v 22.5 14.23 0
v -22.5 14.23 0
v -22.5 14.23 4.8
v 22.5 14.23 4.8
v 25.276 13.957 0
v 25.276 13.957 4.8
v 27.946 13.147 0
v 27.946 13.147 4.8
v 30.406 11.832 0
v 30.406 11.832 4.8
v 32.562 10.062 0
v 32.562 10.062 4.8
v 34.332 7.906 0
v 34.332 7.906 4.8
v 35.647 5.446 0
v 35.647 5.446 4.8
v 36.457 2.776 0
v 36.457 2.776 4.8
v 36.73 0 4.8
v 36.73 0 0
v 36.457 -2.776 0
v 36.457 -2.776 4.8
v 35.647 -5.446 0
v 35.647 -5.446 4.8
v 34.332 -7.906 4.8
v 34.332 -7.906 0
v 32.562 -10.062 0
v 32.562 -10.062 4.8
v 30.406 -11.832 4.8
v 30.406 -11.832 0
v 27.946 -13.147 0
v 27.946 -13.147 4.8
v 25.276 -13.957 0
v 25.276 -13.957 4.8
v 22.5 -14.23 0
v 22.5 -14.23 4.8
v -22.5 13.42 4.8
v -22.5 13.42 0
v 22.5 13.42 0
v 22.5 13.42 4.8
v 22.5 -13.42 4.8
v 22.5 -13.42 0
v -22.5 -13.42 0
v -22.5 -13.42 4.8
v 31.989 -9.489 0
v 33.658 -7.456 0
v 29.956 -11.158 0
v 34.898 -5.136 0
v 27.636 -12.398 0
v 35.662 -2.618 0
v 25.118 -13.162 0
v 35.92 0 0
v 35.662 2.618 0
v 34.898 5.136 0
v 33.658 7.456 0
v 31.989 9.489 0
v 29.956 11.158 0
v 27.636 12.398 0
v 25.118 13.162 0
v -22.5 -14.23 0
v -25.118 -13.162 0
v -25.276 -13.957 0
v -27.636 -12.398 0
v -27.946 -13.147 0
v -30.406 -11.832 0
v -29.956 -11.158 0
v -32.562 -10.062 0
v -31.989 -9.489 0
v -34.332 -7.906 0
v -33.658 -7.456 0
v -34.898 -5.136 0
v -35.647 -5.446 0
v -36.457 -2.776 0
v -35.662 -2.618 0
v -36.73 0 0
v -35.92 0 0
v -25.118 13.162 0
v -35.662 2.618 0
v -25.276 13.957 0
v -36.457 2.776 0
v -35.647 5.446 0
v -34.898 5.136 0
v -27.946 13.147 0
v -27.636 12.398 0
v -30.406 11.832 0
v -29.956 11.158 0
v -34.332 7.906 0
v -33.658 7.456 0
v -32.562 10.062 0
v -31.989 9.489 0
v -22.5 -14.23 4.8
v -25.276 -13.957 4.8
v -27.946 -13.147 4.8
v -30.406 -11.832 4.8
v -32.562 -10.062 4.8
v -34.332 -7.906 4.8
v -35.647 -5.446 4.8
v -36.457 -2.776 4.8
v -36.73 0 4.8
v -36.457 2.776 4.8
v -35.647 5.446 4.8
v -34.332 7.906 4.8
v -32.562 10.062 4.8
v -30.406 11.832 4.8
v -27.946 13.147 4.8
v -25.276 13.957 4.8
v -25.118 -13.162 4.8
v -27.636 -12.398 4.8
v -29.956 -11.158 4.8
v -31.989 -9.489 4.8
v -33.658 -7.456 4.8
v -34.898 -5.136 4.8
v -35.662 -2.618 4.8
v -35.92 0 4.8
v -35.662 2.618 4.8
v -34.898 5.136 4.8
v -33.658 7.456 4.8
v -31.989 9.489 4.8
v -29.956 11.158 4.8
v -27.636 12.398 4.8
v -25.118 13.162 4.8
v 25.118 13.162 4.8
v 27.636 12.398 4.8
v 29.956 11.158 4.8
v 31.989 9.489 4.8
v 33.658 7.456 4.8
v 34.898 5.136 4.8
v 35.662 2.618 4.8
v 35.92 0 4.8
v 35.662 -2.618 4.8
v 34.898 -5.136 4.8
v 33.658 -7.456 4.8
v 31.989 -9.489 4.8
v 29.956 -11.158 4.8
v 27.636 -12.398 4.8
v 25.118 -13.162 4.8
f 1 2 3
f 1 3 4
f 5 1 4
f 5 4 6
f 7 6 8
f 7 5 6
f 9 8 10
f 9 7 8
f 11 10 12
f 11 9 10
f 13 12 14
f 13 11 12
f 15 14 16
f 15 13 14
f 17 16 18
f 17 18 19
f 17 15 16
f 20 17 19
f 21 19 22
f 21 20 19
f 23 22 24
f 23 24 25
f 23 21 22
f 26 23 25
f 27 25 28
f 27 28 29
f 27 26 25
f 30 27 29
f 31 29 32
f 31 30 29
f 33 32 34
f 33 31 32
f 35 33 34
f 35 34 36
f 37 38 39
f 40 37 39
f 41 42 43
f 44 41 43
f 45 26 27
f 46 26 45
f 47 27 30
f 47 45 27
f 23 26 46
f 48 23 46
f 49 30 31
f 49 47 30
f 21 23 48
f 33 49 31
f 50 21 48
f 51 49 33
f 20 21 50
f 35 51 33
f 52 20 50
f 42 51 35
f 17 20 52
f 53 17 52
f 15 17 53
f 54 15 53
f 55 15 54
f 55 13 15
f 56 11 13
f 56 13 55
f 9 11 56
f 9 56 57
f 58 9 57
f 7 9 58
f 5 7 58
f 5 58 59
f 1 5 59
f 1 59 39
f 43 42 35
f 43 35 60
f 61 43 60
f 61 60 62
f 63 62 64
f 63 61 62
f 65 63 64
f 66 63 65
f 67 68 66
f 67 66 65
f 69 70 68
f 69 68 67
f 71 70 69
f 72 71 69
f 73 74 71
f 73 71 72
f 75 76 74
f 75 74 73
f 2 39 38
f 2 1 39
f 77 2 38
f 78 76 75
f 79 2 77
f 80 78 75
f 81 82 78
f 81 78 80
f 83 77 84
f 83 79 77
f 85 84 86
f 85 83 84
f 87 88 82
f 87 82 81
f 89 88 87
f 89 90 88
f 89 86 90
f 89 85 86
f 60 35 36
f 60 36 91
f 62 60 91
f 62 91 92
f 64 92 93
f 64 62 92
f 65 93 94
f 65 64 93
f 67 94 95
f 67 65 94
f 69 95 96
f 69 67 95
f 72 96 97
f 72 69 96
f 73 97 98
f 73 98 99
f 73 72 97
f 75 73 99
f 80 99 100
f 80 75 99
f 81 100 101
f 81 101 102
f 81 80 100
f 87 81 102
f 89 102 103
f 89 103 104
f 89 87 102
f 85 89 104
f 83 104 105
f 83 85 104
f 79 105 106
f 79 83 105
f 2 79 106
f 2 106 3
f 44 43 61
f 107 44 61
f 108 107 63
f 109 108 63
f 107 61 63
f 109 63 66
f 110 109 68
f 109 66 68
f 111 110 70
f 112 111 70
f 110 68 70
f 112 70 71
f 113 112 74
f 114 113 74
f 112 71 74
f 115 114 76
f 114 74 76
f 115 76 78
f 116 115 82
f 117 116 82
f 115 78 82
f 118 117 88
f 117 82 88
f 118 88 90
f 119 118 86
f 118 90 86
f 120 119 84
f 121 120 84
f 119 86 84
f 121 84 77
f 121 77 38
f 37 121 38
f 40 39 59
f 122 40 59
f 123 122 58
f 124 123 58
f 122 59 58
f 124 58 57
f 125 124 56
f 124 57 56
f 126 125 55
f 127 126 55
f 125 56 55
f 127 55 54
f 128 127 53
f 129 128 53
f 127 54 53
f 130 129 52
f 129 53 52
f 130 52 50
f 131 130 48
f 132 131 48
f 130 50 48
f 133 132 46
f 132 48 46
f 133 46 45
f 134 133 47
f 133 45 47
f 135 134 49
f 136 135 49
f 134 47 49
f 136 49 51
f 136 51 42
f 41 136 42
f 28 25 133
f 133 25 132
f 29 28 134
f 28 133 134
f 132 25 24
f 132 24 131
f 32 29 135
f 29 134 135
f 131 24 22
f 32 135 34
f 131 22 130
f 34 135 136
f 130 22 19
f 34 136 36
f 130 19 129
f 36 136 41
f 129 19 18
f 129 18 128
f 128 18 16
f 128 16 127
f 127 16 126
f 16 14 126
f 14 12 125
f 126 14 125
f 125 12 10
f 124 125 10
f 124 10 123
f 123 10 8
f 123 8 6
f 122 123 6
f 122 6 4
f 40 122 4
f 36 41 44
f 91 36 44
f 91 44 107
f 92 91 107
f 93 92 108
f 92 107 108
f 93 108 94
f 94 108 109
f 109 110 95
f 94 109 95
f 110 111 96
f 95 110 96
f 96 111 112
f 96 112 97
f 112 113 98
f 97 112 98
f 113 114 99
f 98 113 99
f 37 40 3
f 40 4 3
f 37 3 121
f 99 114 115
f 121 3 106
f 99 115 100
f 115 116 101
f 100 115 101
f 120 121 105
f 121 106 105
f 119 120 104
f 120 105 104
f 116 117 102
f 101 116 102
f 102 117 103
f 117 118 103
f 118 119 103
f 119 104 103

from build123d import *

# Parameters (mm, degrees)
EXTRUDE_1_DEPTH = 4.8
EXTRUDE_2_DEPTH = 4.8


# Read off the part's stored shape, not the designer's step: 交差1
with BuildPart() as part:
    # ｽｹｯﾁ1 → 押し出し-薄板1 (new body)
    with BuildSketch(Plane.XY):
        with BuildLine():
            Line((-22.5, 14.23), (22.5, 14.23))
            ThreePointArc((22.5, 14.23), (36.73, 0), (22.5, -14.23))
            Line((22.5, -14.23), (-22.5, -14.23))
            ThreePointArc((-22.5, -14.23), (-36.73, 0), (-22.5, 14.23))
        make_face()
        with BuildLine():
            Line((-22.5, 13.42), (22.5, 13.42))
            ThreePointArc((22.5, 13.42), (35.92, 0), (22.5, -13.42))
            Line((22.5, -13.42), (-22.5, -13.42))
            ThreePointArc((-22.5, -13.42), (-35.92, 0), (-22.5, 13.42))
        make_face(mode=Mode.SUBTRACT)
    extrude(amount=EXTRUDE_1_DEPTH)


with BuildPart() as body_2:
    # ｽｹｯﾁ2 → 押し出し-薄板2 (new body)
    with BuildSketch(Plane.XY.offset(4.8)):
        with BuildLine():
            Line((-22.5, -14.23), (22.5, -14.23))
            ThreePointArc((22.5, -14.23), (36.73, 0), (22.5, 14.23))
            Line((22.5, 14.23), (-22.5, 14.23))
            ThreePointArc((-22.5, 14.23), (-36.73, 0), (-22.5, -14.23))
        make_face()
        with BuildLine():
            Line((-22.5, -13.93), (22.5, -13.93))
            ThreePointArc((22.5, -13.93), (36.43, 0), (22.5, 13.93))
            Line((22.5, 13.93), (-22.5, 13.93))
            ThreePointArc((-22.5, 13.93), (-36.43, 0), (-22.5, -13.93))
        make_face(mode=Mode.SUBTRACT)
    extrude(amount=-EXTRUDE_2_DEPTH)


solid = part.part
